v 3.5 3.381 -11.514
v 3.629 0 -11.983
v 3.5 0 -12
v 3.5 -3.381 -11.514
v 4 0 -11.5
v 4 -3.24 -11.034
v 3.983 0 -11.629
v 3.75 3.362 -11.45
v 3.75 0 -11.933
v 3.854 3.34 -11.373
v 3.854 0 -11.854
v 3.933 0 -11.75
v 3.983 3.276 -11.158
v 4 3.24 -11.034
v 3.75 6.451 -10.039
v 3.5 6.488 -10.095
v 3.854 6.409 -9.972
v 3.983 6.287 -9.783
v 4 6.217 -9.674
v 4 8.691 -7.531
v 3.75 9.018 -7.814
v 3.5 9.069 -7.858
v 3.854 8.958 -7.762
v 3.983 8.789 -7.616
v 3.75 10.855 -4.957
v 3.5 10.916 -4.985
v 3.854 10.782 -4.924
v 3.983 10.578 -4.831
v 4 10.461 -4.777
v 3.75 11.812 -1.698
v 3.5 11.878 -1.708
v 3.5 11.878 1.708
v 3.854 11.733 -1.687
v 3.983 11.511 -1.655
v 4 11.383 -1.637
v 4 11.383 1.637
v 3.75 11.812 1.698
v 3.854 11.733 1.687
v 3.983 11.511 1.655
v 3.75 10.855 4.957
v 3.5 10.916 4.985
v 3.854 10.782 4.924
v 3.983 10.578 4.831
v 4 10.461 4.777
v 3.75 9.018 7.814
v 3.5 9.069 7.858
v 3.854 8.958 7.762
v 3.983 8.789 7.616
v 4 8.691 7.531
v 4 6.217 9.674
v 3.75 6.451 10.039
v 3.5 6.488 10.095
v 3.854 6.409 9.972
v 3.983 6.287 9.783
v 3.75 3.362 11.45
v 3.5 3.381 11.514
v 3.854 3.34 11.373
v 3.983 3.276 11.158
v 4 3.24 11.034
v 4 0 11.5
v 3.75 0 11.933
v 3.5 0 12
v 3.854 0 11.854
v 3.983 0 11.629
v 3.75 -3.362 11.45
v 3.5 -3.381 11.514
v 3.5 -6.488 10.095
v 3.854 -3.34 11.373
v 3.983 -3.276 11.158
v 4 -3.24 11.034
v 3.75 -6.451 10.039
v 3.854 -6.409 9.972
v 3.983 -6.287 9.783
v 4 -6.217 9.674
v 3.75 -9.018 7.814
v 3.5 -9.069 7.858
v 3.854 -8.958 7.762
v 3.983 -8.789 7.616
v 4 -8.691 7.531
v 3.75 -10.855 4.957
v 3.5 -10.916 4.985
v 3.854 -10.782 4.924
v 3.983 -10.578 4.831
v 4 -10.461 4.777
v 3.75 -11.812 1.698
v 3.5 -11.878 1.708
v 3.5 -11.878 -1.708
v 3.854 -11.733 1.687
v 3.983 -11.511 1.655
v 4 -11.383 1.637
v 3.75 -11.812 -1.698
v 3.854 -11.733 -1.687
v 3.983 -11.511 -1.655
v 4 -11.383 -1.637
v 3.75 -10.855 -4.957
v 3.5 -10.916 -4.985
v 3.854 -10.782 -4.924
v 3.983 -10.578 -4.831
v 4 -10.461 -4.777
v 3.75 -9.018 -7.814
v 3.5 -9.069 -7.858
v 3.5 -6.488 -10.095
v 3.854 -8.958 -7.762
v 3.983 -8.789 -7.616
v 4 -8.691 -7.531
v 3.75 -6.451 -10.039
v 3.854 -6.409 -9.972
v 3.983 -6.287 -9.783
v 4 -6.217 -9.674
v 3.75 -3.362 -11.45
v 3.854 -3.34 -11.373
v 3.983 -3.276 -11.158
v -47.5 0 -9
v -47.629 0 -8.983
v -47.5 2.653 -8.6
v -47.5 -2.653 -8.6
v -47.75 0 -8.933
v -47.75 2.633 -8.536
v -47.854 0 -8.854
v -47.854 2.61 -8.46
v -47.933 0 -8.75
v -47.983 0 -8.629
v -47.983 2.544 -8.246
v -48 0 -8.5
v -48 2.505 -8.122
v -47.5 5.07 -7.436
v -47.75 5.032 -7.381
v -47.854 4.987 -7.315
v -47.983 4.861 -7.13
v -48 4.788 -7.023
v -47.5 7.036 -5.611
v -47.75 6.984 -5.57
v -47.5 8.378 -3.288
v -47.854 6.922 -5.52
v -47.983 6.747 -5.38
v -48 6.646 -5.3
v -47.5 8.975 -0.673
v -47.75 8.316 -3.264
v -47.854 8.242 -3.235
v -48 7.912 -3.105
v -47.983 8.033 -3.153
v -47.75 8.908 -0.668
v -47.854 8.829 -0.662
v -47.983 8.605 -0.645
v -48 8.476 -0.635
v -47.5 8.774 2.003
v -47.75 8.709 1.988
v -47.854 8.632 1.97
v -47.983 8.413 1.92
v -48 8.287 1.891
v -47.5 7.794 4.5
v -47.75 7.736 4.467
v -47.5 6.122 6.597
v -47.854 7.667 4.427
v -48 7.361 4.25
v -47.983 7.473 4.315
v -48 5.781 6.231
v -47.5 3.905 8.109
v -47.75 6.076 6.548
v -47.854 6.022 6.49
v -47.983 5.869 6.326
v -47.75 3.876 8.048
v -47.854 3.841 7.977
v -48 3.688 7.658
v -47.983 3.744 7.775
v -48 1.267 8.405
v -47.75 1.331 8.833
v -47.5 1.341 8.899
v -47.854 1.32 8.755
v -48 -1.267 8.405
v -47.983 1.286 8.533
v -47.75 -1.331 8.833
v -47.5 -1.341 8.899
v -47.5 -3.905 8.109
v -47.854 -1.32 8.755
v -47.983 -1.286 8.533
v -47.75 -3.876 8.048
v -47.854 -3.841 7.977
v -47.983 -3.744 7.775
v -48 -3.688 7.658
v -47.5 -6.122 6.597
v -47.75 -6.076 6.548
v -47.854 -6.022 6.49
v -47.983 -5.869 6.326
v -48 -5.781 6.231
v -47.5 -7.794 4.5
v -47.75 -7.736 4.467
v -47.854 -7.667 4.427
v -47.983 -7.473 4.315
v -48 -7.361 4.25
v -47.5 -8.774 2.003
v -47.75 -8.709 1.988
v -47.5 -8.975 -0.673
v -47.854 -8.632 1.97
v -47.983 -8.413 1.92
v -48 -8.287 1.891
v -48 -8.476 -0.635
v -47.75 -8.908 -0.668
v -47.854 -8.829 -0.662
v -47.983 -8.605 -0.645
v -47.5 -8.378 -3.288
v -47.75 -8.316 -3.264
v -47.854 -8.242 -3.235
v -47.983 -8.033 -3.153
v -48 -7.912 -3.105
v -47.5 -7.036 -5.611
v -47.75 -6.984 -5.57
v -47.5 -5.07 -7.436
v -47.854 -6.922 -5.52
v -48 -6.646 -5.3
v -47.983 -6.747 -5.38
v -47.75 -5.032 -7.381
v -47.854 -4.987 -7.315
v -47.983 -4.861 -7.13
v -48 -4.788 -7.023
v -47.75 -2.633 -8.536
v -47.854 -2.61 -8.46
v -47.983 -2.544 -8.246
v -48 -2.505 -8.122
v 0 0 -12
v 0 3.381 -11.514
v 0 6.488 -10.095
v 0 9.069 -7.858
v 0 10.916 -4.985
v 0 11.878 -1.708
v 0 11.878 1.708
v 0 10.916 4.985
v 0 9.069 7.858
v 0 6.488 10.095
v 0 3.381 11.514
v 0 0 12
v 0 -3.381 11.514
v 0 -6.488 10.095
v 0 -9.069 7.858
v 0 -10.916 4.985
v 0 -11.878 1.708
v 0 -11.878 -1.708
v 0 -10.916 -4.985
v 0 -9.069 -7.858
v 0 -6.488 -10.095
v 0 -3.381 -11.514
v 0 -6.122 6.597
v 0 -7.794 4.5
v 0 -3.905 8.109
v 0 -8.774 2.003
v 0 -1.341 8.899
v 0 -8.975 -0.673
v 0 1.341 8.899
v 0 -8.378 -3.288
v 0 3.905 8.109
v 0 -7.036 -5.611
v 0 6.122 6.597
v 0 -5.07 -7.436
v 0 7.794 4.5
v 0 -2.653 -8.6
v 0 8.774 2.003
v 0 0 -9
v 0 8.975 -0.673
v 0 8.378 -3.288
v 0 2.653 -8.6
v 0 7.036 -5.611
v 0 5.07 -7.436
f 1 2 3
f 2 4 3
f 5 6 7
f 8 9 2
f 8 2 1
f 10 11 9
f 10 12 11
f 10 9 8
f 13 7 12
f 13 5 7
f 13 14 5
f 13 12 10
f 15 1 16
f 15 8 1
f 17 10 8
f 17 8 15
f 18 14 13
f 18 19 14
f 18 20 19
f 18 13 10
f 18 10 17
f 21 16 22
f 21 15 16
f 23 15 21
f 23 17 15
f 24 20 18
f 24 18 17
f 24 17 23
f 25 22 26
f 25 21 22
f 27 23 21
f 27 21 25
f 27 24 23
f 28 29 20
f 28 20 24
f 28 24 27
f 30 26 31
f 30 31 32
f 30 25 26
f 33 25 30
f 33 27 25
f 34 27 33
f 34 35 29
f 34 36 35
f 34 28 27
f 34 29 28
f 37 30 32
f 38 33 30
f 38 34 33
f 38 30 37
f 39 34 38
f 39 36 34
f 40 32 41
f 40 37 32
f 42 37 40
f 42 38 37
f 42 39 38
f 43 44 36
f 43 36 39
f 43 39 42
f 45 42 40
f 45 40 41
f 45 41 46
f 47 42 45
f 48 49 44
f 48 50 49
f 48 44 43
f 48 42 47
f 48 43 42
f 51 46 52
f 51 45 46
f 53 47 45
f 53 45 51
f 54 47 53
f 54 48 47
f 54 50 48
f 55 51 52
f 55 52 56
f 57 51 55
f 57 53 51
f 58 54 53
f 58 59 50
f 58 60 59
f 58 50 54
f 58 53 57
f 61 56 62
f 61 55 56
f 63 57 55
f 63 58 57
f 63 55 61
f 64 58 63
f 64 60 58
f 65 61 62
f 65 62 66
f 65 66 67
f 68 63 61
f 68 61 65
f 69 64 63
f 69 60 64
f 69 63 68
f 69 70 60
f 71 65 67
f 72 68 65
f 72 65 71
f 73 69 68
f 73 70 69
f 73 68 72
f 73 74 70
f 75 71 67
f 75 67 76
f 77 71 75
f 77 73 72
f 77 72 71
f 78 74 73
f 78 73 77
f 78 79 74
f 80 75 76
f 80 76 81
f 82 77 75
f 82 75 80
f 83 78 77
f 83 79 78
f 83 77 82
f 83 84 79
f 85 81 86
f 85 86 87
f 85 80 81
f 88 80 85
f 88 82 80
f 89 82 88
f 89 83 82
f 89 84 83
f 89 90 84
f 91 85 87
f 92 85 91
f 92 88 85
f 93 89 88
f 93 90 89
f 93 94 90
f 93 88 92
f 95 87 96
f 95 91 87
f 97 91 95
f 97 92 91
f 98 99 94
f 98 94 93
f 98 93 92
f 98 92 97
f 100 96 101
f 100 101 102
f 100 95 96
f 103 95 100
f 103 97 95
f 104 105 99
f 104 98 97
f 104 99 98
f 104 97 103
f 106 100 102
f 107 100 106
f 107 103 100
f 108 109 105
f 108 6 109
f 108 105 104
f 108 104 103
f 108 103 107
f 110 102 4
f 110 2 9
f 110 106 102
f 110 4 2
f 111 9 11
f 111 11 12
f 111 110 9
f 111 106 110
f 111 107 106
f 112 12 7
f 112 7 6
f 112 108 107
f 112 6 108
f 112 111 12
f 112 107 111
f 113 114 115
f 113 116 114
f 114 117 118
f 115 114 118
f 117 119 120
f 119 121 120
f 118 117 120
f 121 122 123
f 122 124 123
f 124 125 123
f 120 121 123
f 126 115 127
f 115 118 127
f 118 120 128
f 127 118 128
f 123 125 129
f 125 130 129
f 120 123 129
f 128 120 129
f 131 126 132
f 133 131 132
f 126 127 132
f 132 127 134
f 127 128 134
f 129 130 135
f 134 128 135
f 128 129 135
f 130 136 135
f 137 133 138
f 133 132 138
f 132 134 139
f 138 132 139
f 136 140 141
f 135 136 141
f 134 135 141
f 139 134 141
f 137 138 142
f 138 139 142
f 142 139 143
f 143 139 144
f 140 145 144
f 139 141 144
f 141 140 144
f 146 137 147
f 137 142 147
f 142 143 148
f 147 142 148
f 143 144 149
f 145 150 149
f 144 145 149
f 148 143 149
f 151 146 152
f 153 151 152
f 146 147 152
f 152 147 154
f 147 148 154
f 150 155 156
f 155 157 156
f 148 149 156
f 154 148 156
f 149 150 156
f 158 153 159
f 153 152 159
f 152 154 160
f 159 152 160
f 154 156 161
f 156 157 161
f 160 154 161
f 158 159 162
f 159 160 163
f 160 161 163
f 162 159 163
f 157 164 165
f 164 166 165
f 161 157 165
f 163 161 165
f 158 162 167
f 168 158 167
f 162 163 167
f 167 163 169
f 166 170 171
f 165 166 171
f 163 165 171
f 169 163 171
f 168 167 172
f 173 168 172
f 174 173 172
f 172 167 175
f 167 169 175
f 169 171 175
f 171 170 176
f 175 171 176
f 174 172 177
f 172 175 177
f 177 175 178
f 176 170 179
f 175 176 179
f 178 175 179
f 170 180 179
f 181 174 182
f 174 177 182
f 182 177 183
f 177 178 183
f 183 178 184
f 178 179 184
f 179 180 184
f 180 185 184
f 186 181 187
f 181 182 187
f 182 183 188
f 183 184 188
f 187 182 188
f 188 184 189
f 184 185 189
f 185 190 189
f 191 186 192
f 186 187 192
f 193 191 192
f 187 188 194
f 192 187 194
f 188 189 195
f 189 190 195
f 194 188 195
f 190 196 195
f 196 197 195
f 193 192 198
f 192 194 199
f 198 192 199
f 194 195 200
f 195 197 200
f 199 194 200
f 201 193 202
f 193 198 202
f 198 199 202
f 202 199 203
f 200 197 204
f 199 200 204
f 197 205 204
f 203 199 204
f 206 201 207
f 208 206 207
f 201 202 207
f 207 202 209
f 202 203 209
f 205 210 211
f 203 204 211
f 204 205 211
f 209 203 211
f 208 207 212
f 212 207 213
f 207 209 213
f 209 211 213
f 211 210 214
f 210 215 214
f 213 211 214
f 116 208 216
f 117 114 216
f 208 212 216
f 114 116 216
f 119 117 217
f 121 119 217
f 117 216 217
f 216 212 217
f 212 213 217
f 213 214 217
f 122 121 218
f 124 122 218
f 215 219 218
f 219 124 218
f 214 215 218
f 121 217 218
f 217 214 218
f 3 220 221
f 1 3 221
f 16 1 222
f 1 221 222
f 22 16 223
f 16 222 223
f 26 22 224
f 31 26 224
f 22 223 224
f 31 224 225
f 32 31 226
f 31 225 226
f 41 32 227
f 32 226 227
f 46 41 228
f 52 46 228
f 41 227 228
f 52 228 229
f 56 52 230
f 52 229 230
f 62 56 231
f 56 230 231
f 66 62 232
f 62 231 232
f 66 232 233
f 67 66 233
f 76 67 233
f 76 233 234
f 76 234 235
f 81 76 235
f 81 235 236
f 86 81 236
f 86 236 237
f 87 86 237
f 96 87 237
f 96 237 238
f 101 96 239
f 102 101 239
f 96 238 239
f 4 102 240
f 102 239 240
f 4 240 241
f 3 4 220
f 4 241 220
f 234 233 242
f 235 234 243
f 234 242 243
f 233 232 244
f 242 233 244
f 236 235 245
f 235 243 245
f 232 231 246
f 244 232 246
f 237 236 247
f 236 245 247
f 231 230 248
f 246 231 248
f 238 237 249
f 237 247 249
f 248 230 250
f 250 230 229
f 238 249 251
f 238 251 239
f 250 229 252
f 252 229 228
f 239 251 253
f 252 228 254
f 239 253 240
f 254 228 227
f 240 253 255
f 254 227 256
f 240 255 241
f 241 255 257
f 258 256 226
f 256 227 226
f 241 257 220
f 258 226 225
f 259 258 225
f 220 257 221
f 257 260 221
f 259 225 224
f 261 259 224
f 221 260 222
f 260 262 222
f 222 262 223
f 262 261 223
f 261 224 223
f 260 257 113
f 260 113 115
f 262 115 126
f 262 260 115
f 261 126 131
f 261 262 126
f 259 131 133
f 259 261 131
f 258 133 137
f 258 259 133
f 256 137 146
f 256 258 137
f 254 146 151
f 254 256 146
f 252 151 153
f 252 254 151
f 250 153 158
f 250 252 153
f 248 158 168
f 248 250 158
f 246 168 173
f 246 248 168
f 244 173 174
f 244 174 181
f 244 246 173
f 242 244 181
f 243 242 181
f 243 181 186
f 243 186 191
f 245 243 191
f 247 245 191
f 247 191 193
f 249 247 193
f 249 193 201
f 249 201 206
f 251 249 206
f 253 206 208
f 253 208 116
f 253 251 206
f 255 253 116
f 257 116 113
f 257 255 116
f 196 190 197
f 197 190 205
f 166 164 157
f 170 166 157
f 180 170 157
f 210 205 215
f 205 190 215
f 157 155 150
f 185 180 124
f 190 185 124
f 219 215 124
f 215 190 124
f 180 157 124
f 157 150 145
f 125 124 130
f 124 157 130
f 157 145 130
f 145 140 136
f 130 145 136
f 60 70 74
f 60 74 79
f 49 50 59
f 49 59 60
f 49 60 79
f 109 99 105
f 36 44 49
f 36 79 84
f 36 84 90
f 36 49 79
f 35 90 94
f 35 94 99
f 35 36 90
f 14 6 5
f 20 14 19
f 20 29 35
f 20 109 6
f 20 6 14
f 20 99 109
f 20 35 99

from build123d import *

# Parameters (mm, degrees)
SKETCH_1_R      = 9
EXTRUDE_1_DEPTH = 48
SKETCH_2_R      = 12
EXTRUDE_2_DEPTH = 4
FILLET_1_R      = 0.5
FILLET_2_R      = 0.5


with BuildPart() as part:
    # 草图1 → 凸台-拉伸1 (new body)
    with BuildSketch(Plane(origin=(0, 0, 0), x_dir=(0, 0, -1), z_dir=(1, 0, 0))):
        Circle(SKETCH_1_R)
    extrude(amount=-EXTRUDE_1_DEPTH)

    # 草图2 → 凸台-拉伸2 (add)
    with BuildSketch(Plane(origin=(0, 0, 0), x_dir=(0, 0, -1), z_dir=(1, 0, 0))):
        Circle(SKETCH_2_R)
    extrude(amount=EXTRUDE_2_DEPTH)

    # 圆角1
    fillet_1_edges = [part.edges().sort_by_distance(p)[0] for p in [
        (4, 0, 12),
    ]]
    fillet(fillet_1_edges, radius=FILLET_1_R)

    # 圆角2
    fillet_2_edges = [part.edges().sort_by_distance(p)[0] for p in [
        (-48, 0, 9),
    ]]
    fillet(fillet_2_edges, radius=FILLET_2_R)


solid = part.part
